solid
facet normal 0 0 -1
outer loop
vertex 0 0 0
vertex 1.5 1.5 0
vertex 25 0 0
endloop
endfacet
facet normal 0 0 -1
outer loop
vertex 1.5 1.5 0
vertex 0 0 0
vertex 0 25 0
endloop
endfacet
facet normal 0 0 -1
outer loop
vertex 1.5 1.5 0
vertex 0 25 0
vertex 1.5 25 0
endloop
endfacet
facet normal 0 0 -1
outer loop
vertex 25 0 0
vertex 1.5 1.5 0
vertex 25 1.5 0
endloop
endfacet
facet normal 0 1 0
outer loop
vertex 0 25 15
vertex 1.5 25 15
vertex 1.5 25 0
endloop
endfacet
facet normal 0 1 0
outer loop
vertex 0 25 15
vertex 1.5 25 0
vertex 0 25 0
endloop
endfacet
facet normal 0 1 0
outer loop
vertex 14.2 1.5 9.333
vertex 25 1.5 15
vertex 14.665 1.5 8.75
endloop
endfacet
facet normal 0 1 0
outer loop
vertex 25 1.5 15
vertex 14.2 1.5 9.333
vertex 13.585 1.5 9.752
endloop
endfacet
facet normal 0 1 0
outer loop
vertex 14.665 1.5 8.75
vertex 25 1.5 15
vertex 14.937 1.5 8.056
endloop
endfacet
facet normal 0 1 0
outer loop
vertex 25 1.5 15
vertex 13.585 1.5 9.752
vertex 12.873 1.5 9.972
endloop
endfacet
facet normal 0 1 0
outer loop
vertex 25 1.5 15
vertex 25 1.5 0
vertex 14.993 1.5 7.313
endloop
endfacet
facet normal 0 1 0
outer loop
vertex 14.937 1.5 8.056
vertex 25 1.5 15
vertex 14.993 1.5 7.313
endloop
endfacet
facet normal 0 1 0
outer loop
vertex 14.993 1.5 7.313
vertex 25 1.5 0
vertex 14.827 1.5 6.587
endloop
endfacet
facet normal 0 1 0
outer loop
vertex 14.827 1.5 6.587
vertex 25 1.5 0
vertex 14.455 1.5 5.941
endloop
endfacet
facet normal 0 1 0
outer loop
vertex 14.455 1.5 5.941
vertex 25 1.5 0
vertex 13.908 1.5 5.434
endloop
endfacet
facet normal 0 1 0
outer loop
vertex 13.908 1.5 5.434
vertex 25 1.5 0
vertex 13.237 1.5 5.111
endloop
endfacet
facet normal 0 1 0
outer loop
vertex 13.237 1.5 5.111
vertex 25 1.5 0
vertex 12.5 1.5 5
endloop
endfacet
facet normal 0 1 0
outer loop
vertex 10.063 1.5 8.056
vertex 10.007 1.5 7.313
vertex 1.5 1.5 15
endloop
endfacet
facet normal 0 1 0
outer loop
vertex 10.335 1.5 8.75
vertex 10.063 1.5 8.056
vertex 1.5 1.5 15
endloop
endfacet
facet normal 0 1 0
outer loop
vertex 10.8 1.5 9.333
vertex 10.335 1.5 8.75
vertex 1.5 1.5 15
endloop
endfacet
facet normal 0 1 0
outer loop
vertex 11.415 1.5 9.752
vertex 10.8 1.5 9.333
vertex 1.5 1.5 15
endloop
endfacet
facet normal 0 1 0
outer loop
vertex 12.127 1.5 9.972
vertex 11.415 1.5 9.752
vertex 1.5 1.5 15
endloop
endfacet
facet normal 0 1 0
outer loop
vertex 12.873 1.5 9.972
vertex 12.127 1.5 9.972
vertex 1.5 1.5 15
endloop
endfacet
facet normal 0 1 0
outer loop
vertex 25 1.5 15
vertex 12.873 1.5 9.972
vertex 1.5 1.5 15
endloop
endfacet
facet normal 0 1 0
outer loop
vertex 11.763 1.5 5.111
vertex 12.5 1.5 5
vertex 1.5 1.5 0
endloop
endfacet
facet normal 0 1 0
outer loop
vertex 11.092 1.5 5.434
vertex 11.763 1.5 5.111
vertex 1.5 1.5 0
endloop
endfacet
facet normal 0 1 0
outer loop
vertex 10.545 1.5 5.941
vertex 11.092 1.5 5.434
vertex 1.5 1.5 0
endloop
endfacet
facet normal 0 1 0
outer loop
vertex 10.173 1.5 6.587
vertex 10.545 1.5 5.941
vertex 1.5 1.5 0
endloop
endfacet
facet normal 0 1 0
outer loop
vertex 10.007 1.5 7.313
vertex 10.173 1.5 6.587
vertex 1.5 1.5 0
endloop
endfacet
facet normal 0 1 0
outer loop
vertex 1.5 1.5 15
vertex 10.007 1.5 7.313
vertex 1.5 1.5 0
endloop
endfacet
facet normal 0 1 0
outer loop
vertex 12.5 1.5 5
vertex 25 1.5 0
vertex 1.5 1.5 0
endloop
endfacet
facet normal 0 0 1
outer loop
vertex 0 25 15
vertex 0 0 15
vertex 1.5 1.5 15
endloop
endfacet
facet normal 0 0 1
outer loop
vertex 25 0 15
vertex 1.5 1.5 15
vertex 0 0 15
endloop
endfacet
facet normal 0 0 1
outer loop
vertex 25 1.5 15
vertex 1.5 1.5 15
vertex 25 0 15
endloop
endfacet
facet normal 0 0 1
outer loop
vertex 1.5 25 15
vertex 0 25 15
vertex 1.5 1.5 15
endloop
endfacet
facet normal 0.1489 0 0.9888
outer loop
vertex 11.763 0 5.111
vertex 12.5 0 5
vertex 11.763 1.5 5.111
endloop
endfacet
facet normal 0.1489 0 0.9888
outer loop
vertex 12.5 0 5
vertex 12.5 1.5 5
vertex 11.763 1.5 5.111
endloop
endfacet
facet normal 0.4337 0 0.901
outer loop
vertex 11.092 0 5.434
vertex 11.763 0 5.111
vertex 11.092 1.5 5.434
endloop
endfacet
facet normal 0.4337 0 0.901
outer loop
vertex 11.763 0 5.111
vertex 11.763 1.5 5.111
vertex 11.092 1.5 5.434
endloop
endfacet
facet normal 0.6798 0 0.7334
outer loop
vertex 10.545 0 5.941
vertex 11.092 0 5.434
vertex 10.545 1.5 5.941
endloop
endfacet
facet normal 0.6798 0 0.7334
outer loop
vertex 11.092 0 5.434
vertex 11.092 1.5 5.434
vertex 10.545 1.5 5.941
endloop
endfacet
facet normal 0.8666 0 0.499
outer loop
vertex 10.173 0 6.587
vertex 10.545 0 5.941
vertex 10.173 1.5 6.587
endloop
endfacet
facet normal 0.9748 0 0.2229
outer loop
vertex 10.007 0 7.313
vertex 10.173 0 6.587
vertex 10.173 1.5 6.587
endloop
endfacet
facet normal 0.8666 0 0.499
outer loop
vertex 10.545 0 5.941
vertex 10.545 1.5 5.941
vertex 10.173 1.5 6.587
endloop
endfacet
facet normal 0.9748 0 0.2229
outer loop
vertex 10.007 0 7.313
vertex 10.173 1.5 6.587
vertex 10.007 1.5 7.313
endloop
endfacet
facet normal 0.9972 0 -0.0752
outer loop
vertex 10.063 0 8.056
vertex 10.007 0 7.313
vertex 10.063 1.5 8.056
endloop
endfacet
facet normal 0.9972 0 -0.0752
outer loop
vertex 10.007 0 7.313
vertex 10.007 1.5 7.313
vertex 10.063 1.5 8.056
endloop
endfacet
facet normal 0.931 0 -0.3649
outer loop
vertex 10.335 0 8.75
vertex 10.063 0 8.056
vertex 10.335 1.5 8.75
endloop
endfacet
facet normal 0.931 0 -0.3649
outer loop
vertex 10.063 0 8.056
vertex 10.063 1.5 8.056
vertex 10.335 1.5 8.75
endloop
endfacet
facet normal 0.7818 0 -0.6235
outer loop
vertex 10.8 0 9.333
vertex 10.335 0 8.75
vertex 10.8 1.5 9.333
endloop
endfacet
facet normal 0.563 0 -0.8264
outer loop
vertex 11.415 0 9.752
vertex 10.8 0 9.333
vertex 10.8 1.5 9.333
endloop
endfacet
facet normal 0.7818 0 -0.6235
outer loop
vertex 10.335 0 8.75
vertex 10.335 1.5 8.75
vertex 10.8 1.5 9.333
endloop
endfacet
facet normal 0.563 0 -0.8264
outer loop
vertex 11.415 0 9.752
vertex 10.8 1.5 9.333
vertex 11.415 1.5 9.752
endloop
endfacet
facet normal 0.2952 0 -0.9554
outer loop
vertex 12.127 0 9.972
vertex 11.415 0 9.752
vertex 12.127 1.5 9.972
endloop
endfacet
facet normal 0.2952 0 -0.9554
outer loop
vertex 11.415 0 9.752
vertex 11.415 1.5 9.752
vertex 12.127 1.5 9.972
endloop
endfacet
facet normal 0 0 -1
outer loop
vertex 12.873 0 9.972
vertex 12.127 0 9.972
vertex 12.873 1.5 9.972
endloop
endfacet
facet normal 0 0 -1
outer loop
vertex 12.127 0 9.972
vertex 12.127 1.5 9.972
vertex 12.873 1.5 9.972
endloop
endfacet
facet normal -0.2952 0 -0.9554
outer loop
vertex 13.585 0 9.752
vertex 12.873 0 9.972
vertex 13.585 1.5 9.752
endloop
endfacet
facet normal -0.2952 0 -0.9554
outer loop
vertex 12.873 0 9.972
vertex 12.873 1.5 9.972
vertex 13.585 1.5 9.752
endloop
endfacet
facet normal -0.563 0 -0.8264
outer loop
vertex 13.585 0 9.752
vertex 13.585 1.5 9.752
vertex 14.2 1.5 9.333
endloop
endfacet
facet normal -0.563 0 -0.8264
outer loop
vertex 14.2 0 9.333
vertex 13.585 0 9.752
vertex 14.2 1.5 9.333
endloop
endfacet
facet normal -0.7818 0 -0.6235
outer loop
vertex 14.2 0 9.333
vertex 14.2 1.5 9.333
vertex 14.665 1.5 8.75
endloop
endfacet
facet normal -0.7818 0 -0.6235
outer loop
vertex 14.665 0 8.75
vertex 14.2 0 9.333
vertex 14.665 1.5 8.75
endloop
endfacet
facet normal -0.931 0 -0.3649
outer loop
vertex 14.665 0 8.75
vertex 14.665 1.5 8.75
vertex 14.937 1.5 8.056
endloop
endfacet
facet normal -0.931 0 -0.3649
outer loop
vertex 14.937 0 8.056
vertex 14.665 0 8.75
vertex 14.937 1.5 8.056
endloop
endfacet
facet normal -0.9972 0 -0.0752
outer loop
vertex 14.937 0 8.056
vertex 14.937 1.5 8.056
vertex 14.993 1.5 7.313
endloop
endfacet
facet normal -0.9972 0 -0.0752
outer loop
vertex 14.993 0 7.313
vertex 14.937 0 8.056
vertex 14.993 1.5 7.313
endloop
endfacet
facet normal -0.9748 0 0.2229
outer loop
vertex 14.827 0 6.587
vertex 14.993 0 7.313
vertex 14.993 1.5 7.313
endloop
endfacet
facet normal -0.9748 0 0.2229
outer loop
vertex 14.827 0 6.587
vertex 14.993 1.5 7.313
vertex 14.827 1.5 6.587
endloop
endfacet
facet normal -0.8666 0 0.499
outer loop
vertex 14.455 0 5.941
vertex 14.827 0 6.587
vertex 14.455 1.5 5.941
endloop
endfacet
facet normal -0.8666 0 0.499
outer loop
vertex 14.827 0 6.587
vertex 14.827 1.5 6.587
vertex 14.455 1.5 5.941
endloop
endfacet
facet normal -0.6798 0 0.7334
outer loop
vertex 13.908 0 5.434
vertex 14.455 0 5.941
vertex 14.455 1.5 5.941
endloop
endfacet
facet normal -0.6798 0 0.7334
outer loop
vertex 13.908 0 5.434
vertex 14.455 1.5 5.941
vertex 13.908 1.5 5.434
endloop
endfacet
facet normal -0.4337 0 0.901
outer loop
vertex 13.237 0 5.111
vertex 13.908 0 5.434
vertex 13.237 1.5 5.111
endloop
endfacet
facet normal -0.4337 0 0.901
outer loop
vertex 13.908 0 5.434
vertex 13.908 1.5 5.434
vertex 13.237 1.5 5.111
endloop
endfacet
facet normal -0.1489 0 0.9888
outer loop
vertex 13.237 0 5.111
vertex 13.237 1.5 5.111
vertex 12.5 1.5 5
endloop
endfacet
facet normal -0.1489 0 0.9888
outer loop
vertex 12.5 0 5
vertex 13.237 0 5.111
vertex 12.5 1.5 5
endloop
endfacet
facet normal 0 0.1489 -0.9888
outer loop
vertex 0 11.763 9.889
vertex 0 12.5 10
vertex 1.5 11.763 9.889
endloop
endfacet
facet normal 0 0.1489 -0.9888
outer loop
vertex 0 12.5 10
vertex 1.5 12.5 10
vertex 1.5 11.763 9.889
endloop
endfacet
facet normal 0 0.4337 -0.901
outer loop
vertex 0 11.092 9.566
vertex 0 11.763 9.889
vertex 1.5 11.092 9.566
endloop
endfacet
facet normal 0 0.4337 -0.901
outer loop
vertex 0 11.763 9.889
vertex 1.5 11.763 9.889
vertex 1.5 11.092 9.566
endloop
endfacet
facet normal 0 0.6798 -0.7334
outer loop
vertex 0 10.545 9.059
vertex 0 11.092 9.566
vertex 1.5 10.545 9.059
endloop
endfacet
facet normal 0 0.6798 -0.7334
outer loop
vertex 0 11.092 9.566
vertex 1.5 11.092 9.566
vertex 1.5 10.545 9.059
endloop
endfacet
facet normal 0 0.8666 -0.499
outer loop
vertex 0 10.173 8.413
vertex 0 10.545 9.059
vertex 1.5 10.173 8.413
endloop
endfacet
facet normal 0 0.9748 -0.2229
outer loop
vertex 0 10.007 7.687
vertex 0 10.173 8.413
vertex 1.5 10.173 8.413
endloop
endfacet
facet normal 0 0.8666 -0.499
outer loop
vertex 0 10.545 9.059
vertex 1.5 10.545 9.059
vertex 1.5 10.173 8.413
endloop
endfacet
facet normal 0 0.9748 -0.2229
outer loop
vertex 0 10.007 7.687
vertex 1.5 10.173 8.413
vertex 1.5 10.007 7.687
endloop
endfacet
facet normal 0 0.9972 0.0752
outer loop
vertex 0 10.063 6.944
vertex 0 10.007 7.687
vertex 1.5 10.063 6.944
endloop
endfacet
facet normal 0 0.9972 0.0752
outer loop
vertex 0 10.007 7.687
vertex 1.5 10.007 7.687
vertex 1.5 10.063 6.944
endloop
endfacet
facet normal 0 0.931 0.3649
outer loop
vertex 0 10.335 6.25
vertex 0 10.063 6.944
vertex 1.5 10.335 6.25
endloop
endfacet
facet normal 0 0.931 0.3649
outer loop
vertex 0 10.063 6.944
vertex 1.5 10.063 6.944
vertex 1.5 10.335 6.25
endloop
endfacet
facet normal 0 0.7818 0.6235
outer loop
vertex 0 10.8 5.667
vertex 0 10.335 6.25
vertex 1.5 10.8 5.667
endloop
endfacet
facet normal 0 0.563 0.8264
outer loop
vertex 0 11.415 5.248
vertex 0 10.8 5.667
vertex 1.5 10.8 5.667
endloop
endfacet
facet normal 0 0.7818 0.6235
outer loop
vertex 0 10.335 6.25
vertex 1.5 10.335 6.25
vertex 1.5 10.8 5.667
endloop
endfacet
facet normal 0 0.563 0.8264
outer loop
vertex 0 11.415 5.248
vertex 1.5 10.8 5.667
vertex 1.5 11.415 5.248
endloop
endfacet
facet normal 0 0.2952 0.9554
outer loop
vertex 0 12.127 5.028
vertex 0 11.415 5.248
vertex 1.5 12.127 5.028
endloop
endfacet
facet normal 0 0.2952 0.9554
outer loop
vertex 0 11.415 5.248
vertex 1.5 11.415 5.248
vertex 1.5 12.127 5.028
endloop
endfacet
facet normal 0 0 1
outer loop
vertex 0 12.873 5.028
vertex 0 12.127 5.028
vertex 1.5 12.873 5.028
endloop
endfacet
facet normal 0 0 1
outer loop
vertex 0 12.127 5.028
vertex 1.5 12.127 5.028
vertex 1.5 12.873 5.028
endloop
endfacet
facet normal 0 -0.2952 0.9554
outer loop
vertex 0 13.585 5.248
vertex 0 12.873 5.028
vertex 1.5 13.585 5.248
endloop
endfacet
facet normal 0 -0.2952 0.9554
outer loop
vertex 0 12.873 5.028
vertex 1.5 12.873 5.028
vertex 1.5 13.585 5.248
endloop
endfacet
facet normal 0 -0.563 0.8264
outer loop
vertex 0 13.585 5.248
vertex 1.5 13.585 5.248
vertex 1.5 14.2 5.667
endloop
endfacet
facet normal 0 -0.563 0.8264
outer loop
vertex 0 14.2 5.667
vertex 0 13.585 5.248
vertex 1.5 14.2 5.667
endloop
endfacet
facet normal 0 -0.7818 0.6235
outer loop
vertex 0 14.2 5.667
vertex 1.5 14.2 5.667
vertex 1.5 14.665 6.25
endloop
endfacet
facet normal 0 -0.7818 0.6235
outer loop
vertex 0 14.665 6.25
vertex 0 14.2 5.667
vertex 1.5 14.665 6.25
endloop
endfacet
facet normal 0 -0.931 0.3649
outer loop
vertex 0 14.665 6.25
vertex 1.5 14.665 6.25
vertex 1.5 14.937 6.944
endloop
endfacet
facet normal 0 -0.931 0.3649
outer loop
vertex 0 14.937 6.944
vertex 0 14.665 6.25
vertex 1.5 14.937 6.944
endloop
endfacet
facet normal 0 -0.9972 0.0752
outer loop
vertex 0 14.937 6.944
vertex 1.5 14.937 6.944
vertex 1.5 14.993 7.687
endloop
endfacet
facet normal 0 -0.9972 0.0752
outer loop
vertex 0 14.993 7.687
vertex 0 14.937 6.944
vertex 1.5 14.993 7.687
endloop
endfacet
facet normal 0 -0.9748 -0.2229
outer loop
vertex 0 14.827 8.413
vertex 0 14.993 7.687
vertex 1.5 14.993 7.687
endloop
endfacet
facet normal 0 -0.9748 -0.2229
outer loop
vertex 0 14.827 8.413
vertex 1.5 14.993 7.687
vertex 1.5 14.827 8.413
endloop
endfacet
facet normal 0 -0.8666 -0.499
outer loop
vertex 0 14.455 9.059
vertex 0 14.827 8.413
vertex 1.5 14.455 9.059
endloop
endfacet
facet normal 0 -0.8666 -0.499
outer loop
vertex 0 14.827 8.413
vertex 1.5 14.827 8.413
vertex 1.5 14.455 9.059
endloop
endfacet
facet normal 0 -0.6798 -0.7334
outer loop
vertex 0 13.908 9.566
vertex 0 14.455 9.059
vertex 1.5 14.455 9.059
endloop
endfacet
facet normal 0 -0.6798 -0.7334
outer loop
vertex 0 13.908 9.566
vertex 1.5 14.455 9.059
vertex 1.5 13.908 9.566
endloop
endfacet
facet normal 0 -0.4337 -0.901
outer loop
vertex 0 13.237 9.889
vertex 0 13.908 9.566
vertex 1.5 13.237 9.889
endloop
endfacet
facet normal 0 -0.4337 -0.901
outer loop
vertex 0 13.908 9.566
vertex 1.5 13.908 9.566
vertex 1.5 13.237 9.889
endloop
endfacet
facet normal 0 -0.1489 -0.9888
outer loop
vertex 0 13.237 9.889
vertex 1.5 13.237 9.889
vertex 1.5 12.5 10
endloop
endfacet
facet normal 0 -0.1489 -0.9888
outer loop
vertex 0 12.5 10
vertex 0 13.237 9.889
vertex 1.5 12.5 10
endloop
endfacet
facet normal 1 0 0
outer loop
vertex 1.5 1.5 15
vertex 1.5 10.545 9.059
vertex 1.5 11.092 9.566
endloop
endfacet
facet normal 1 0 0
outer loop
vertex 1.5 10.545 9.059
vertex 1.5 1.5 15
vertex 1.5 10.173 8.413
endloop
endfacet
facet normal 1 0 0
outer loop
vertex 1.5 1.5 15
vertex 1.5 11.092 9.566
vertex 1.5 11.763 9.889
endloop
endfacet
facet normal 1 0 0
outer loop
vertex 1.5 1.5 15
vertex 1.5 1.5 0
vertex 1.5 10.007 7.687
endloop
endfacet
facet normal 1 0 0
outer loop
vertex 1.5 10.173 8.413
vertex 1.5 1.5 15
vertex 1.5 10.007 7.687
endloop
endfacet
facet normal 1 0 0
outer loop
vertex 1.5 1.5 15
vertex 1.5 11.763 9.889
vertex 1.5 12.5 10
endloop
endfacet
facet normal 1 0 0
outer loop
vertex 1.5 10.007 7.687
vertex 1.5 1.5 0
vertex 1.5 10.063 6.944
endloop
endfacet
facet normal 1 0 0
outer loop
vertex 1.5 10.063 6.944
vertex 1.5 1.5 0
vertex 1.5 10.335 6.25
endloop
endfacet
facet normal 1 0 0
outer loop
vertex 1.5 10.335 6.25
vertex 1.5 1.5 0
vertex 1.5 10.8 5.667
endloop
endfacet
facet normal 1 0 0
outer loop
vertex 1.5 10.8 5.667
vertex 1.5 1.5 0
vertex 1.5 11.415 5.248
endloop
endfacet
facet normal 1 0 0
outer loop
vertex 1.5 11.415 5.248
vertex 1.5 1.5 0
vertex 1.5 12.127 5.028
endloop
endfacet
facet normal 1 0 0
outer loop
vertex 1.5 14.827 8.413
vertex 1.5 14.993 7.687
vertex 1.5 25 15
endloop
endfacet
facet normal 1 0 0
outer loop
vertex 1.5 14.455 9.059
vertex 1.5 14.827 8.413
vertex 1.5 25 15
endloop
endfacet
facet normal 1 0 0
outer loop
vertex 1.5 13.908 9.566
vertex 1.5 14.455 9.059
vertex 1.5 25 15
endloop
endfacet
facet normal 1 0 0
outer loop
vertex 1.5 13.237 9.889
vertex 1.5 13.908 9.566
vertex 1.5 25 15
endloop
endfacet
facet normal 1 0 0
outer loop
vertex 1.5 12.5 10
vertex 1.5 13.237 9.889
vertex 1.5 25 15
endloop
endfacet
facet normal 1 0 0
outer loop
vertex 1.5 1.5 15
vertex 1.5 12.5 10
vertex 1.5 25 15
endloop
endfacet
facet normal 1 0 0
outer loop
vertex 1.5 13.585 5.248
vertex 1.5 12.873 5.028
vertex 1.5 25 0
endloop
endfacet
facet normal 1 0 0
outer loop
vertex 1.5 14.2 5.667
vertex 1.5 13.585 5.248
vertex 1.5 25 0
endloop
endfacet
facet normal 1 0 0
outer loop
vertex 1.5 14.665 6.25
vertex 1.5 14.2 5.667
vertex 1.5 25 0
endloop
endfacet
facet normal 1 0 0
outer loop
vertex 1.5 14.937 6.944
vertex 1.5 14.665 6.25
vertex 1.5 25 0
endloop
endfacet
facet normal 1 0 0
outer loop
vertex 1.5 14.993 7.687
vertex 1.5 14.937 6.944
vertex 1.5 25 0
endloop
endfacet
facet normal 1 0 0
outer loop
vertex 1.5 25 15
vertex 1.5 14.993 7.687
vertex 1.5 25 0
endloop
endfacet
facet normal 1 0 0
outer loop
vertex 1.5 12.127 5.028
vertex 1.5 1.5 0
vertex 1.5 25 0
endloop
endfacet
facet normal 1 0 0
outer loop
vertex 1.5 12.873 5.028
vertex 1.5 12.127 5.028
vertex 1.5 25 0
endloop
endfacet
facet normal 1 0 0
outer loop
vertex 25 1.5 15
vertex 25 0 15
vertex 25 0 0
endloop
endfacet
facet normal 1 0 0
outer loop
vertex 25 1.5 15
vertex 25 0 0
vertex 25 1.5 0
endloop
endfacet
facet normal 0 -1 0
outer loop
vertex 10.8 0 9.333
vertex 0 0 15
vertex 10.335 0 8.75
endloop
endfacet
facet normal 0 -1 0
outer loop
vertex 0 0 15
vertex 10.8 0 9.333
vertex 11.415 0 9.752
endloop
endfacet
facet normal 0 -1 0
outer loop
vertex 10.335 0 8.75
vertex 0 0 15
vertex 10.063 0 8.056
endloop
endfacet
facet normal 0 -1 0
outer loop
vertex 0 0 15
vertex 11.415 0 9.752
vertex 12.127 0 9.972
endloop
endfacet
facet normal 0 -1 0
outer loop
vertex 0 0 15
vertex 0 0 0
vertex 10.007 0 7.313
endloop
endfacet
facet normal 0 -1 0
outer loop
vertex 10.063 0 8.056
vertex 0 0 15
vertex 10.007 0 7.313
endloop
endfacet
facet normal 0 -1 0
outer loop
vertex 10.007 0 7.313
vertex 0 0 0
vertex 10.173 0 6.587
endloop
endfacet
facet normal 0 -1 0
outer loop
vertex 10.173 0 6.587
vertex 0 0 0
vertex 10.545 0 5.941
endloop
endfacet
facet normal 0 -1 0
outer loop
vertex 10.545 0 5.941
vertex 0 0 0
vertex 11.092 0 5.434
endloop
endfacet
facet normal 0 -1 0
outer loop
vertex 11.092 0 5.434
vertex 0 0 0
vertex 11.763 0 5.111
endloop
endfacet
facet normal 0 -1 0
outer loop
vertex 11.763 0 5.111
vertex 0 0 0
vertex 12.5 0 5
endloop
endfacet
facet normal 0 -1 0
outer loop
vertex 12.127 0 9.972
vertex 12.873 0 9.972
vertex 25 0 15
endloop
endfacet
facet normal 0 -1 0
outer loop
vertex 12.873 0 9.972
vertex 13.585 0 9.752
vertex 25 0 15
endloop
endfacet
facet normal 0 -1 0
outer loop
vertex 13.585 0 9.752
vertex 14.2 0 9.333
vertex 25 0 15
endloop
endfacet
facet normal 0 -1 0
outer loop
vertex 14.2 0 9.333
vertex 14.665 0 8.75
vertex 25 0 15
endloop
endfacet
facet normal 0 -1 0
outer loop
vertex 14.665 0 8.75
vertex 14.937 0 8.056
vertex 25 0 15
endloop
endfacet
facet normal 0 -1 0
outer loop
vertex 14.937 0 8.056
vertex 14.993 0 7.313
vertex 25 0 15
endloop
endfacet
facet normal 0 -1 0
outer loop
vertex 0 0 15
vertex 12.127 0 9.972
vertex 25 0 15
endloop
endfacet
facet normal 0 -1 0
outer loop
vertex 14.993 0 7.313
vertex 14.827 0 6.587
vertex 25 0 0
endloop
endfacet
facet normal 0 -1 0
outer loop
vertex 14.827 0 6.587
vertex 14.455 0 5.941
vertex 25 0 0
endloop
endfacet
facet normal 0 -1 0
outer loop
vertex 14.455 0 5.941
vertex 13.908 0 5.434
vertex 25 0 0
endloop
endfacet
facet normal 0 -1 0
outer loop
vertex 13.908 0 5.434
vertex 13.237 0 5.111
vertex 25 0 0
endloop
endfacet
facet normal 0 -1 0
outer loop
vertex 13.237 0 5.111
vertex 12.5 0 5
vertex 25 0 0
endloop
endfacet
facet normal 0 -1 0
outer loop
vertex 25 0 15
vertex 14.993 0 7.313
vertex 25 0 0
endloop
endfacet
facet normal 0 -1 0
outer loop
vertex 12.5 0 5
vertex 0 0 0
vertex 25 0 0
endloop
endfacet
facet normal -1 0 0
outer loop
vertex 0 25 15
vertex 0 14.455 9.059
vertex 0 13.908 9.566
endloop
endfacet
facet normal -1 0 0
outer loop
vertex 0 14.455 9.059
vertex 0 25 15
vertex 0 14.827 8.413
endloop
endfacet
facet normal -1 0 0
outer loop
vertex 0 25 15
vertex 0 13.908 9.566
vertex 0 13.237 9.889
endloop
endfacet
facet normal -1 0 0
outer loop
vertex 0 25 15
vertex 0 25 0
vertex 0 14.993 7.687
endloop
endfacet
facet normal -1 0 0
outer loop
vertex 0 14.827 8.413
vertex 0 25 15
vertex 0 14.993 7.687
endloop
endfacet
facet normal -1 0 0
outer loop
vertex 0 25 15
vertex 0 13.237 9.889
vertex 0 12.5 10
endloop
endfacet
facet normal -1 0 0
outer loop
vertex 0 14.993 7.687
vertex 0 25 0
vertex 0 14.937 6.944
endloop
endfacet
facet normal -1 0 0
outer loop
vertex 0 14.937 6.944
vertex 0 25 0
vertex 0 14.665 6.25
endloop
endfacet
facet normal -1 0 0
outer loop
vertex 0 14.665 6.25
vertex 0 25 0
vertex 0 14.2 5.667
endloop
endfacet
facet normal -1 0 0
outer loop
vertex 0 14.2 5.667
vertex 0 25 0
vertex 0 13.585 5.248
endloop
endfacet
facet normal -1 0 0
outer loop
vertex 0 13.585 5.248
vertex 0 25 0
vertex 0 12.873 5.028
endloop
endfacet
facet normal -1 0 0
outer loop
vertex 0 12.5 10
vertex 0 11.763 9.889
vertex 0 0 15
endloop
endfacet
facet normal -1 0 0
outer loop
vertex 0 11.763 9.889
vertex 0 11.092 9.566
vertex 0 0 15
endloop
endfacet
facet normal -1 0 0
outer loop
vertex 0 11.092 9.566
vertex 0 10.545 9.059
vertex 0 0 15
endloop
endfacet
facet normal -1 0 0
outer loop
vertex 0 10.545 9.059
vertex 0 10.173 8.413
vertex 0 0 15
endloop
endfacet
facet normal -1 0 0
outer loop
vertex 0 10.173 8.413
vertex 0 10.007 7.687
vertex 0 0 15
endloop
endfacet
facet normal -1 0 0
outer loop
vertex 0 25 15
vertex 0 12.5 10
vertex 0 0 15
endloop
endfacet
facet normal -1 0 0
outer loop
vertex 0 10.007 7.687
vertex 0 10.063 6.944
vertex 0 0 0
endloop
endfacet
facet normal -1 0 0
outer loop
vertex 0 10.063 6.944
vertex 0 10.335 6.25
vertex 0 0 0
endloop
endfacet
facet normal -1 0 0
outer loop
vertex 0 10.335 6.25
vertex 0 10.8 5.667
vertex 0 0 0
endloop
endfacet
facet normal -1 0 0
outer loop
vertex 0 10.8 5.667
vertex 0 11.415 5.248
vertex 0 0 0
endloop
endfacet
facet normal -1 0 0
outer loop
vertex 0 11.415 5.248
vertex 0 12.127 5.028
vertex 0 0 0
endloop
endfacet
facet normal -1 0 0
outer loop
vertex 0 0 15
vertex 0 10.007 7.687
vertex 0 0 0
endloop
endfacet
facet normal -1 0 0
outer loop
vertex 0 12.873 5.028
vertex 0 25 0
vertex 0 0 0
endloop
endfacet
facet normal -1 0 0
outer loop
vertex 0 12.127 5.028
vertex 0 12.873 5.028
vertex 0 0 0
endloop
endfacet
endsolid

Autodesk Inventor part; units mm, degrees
ref_plane "YZ Plane" through (0, 0, 0) normal (1, 0, 0) x (0, 1, 0)
ref_plane "XZ Plane" through (0, 0, 0) normal (0, 1, 0) x (-1, 0, 0)
ref_plane "XY Plane" through (0, 0, 0) normal (0, 0, 1) x (1, 0, 0)
sketch "Sketch1" plane through (0, 0, 0) normal (0, 0, 1) x (1, 0, 0)
  line L0 (0, 0) -> (25, 0)
  line L1 (25, 0) -> (25, 1.5)
  line L2 (25, 1.5) -> (0, 1.5)
  line L3 (0, 1.5) -> (0, 0)
  line L4 (0, 1.5) -> (1.5, 1.5)
  line L5 (1.5, 1.5) -> (1.5, 25)
  line L6 (1.5, 25) -> (0, 25)
  line L7 (0, 25) -> (0, 1.5)
  point P0 (1.5, 1.5)
  dimension "d0" = 25
  dimension "d1" = 1.5
  dimension "d2" = 25
extrude "Extrusion1" add sketch "Sketch1" along normal blind 15
sketch "Sketch2" plane through (0, 0, 0) normal (0, -1, 0) x (1, 0, 0)
  point P0 (0, 0)
  point P1 (12.5, 7.5)
  dimension "d5" = 12.5
  dimension "d6" = 7.5
hole "Hole1" at (12.5, 0, 7.5) direction (0, 1, 0) diameter 5 depth 8 tip angle 118
sketch "Sketch3" plane through (0, 0, 0) normal (-1, 0, 0) x (0, 0, 1)
  point P0 (0, 0)
  point P1 (7.5, 12.5)
  dimension "d14" = 12.5
  dimension "d15" = 7.5
hole "Hole2" at (0, 12.5, 7.5) direction (1, 0, 0) diameter 5 depth 8 tip angle 118
equation "\"d2\" = d0"
properties part number "25x25x25 Simple Angle Bracket"
